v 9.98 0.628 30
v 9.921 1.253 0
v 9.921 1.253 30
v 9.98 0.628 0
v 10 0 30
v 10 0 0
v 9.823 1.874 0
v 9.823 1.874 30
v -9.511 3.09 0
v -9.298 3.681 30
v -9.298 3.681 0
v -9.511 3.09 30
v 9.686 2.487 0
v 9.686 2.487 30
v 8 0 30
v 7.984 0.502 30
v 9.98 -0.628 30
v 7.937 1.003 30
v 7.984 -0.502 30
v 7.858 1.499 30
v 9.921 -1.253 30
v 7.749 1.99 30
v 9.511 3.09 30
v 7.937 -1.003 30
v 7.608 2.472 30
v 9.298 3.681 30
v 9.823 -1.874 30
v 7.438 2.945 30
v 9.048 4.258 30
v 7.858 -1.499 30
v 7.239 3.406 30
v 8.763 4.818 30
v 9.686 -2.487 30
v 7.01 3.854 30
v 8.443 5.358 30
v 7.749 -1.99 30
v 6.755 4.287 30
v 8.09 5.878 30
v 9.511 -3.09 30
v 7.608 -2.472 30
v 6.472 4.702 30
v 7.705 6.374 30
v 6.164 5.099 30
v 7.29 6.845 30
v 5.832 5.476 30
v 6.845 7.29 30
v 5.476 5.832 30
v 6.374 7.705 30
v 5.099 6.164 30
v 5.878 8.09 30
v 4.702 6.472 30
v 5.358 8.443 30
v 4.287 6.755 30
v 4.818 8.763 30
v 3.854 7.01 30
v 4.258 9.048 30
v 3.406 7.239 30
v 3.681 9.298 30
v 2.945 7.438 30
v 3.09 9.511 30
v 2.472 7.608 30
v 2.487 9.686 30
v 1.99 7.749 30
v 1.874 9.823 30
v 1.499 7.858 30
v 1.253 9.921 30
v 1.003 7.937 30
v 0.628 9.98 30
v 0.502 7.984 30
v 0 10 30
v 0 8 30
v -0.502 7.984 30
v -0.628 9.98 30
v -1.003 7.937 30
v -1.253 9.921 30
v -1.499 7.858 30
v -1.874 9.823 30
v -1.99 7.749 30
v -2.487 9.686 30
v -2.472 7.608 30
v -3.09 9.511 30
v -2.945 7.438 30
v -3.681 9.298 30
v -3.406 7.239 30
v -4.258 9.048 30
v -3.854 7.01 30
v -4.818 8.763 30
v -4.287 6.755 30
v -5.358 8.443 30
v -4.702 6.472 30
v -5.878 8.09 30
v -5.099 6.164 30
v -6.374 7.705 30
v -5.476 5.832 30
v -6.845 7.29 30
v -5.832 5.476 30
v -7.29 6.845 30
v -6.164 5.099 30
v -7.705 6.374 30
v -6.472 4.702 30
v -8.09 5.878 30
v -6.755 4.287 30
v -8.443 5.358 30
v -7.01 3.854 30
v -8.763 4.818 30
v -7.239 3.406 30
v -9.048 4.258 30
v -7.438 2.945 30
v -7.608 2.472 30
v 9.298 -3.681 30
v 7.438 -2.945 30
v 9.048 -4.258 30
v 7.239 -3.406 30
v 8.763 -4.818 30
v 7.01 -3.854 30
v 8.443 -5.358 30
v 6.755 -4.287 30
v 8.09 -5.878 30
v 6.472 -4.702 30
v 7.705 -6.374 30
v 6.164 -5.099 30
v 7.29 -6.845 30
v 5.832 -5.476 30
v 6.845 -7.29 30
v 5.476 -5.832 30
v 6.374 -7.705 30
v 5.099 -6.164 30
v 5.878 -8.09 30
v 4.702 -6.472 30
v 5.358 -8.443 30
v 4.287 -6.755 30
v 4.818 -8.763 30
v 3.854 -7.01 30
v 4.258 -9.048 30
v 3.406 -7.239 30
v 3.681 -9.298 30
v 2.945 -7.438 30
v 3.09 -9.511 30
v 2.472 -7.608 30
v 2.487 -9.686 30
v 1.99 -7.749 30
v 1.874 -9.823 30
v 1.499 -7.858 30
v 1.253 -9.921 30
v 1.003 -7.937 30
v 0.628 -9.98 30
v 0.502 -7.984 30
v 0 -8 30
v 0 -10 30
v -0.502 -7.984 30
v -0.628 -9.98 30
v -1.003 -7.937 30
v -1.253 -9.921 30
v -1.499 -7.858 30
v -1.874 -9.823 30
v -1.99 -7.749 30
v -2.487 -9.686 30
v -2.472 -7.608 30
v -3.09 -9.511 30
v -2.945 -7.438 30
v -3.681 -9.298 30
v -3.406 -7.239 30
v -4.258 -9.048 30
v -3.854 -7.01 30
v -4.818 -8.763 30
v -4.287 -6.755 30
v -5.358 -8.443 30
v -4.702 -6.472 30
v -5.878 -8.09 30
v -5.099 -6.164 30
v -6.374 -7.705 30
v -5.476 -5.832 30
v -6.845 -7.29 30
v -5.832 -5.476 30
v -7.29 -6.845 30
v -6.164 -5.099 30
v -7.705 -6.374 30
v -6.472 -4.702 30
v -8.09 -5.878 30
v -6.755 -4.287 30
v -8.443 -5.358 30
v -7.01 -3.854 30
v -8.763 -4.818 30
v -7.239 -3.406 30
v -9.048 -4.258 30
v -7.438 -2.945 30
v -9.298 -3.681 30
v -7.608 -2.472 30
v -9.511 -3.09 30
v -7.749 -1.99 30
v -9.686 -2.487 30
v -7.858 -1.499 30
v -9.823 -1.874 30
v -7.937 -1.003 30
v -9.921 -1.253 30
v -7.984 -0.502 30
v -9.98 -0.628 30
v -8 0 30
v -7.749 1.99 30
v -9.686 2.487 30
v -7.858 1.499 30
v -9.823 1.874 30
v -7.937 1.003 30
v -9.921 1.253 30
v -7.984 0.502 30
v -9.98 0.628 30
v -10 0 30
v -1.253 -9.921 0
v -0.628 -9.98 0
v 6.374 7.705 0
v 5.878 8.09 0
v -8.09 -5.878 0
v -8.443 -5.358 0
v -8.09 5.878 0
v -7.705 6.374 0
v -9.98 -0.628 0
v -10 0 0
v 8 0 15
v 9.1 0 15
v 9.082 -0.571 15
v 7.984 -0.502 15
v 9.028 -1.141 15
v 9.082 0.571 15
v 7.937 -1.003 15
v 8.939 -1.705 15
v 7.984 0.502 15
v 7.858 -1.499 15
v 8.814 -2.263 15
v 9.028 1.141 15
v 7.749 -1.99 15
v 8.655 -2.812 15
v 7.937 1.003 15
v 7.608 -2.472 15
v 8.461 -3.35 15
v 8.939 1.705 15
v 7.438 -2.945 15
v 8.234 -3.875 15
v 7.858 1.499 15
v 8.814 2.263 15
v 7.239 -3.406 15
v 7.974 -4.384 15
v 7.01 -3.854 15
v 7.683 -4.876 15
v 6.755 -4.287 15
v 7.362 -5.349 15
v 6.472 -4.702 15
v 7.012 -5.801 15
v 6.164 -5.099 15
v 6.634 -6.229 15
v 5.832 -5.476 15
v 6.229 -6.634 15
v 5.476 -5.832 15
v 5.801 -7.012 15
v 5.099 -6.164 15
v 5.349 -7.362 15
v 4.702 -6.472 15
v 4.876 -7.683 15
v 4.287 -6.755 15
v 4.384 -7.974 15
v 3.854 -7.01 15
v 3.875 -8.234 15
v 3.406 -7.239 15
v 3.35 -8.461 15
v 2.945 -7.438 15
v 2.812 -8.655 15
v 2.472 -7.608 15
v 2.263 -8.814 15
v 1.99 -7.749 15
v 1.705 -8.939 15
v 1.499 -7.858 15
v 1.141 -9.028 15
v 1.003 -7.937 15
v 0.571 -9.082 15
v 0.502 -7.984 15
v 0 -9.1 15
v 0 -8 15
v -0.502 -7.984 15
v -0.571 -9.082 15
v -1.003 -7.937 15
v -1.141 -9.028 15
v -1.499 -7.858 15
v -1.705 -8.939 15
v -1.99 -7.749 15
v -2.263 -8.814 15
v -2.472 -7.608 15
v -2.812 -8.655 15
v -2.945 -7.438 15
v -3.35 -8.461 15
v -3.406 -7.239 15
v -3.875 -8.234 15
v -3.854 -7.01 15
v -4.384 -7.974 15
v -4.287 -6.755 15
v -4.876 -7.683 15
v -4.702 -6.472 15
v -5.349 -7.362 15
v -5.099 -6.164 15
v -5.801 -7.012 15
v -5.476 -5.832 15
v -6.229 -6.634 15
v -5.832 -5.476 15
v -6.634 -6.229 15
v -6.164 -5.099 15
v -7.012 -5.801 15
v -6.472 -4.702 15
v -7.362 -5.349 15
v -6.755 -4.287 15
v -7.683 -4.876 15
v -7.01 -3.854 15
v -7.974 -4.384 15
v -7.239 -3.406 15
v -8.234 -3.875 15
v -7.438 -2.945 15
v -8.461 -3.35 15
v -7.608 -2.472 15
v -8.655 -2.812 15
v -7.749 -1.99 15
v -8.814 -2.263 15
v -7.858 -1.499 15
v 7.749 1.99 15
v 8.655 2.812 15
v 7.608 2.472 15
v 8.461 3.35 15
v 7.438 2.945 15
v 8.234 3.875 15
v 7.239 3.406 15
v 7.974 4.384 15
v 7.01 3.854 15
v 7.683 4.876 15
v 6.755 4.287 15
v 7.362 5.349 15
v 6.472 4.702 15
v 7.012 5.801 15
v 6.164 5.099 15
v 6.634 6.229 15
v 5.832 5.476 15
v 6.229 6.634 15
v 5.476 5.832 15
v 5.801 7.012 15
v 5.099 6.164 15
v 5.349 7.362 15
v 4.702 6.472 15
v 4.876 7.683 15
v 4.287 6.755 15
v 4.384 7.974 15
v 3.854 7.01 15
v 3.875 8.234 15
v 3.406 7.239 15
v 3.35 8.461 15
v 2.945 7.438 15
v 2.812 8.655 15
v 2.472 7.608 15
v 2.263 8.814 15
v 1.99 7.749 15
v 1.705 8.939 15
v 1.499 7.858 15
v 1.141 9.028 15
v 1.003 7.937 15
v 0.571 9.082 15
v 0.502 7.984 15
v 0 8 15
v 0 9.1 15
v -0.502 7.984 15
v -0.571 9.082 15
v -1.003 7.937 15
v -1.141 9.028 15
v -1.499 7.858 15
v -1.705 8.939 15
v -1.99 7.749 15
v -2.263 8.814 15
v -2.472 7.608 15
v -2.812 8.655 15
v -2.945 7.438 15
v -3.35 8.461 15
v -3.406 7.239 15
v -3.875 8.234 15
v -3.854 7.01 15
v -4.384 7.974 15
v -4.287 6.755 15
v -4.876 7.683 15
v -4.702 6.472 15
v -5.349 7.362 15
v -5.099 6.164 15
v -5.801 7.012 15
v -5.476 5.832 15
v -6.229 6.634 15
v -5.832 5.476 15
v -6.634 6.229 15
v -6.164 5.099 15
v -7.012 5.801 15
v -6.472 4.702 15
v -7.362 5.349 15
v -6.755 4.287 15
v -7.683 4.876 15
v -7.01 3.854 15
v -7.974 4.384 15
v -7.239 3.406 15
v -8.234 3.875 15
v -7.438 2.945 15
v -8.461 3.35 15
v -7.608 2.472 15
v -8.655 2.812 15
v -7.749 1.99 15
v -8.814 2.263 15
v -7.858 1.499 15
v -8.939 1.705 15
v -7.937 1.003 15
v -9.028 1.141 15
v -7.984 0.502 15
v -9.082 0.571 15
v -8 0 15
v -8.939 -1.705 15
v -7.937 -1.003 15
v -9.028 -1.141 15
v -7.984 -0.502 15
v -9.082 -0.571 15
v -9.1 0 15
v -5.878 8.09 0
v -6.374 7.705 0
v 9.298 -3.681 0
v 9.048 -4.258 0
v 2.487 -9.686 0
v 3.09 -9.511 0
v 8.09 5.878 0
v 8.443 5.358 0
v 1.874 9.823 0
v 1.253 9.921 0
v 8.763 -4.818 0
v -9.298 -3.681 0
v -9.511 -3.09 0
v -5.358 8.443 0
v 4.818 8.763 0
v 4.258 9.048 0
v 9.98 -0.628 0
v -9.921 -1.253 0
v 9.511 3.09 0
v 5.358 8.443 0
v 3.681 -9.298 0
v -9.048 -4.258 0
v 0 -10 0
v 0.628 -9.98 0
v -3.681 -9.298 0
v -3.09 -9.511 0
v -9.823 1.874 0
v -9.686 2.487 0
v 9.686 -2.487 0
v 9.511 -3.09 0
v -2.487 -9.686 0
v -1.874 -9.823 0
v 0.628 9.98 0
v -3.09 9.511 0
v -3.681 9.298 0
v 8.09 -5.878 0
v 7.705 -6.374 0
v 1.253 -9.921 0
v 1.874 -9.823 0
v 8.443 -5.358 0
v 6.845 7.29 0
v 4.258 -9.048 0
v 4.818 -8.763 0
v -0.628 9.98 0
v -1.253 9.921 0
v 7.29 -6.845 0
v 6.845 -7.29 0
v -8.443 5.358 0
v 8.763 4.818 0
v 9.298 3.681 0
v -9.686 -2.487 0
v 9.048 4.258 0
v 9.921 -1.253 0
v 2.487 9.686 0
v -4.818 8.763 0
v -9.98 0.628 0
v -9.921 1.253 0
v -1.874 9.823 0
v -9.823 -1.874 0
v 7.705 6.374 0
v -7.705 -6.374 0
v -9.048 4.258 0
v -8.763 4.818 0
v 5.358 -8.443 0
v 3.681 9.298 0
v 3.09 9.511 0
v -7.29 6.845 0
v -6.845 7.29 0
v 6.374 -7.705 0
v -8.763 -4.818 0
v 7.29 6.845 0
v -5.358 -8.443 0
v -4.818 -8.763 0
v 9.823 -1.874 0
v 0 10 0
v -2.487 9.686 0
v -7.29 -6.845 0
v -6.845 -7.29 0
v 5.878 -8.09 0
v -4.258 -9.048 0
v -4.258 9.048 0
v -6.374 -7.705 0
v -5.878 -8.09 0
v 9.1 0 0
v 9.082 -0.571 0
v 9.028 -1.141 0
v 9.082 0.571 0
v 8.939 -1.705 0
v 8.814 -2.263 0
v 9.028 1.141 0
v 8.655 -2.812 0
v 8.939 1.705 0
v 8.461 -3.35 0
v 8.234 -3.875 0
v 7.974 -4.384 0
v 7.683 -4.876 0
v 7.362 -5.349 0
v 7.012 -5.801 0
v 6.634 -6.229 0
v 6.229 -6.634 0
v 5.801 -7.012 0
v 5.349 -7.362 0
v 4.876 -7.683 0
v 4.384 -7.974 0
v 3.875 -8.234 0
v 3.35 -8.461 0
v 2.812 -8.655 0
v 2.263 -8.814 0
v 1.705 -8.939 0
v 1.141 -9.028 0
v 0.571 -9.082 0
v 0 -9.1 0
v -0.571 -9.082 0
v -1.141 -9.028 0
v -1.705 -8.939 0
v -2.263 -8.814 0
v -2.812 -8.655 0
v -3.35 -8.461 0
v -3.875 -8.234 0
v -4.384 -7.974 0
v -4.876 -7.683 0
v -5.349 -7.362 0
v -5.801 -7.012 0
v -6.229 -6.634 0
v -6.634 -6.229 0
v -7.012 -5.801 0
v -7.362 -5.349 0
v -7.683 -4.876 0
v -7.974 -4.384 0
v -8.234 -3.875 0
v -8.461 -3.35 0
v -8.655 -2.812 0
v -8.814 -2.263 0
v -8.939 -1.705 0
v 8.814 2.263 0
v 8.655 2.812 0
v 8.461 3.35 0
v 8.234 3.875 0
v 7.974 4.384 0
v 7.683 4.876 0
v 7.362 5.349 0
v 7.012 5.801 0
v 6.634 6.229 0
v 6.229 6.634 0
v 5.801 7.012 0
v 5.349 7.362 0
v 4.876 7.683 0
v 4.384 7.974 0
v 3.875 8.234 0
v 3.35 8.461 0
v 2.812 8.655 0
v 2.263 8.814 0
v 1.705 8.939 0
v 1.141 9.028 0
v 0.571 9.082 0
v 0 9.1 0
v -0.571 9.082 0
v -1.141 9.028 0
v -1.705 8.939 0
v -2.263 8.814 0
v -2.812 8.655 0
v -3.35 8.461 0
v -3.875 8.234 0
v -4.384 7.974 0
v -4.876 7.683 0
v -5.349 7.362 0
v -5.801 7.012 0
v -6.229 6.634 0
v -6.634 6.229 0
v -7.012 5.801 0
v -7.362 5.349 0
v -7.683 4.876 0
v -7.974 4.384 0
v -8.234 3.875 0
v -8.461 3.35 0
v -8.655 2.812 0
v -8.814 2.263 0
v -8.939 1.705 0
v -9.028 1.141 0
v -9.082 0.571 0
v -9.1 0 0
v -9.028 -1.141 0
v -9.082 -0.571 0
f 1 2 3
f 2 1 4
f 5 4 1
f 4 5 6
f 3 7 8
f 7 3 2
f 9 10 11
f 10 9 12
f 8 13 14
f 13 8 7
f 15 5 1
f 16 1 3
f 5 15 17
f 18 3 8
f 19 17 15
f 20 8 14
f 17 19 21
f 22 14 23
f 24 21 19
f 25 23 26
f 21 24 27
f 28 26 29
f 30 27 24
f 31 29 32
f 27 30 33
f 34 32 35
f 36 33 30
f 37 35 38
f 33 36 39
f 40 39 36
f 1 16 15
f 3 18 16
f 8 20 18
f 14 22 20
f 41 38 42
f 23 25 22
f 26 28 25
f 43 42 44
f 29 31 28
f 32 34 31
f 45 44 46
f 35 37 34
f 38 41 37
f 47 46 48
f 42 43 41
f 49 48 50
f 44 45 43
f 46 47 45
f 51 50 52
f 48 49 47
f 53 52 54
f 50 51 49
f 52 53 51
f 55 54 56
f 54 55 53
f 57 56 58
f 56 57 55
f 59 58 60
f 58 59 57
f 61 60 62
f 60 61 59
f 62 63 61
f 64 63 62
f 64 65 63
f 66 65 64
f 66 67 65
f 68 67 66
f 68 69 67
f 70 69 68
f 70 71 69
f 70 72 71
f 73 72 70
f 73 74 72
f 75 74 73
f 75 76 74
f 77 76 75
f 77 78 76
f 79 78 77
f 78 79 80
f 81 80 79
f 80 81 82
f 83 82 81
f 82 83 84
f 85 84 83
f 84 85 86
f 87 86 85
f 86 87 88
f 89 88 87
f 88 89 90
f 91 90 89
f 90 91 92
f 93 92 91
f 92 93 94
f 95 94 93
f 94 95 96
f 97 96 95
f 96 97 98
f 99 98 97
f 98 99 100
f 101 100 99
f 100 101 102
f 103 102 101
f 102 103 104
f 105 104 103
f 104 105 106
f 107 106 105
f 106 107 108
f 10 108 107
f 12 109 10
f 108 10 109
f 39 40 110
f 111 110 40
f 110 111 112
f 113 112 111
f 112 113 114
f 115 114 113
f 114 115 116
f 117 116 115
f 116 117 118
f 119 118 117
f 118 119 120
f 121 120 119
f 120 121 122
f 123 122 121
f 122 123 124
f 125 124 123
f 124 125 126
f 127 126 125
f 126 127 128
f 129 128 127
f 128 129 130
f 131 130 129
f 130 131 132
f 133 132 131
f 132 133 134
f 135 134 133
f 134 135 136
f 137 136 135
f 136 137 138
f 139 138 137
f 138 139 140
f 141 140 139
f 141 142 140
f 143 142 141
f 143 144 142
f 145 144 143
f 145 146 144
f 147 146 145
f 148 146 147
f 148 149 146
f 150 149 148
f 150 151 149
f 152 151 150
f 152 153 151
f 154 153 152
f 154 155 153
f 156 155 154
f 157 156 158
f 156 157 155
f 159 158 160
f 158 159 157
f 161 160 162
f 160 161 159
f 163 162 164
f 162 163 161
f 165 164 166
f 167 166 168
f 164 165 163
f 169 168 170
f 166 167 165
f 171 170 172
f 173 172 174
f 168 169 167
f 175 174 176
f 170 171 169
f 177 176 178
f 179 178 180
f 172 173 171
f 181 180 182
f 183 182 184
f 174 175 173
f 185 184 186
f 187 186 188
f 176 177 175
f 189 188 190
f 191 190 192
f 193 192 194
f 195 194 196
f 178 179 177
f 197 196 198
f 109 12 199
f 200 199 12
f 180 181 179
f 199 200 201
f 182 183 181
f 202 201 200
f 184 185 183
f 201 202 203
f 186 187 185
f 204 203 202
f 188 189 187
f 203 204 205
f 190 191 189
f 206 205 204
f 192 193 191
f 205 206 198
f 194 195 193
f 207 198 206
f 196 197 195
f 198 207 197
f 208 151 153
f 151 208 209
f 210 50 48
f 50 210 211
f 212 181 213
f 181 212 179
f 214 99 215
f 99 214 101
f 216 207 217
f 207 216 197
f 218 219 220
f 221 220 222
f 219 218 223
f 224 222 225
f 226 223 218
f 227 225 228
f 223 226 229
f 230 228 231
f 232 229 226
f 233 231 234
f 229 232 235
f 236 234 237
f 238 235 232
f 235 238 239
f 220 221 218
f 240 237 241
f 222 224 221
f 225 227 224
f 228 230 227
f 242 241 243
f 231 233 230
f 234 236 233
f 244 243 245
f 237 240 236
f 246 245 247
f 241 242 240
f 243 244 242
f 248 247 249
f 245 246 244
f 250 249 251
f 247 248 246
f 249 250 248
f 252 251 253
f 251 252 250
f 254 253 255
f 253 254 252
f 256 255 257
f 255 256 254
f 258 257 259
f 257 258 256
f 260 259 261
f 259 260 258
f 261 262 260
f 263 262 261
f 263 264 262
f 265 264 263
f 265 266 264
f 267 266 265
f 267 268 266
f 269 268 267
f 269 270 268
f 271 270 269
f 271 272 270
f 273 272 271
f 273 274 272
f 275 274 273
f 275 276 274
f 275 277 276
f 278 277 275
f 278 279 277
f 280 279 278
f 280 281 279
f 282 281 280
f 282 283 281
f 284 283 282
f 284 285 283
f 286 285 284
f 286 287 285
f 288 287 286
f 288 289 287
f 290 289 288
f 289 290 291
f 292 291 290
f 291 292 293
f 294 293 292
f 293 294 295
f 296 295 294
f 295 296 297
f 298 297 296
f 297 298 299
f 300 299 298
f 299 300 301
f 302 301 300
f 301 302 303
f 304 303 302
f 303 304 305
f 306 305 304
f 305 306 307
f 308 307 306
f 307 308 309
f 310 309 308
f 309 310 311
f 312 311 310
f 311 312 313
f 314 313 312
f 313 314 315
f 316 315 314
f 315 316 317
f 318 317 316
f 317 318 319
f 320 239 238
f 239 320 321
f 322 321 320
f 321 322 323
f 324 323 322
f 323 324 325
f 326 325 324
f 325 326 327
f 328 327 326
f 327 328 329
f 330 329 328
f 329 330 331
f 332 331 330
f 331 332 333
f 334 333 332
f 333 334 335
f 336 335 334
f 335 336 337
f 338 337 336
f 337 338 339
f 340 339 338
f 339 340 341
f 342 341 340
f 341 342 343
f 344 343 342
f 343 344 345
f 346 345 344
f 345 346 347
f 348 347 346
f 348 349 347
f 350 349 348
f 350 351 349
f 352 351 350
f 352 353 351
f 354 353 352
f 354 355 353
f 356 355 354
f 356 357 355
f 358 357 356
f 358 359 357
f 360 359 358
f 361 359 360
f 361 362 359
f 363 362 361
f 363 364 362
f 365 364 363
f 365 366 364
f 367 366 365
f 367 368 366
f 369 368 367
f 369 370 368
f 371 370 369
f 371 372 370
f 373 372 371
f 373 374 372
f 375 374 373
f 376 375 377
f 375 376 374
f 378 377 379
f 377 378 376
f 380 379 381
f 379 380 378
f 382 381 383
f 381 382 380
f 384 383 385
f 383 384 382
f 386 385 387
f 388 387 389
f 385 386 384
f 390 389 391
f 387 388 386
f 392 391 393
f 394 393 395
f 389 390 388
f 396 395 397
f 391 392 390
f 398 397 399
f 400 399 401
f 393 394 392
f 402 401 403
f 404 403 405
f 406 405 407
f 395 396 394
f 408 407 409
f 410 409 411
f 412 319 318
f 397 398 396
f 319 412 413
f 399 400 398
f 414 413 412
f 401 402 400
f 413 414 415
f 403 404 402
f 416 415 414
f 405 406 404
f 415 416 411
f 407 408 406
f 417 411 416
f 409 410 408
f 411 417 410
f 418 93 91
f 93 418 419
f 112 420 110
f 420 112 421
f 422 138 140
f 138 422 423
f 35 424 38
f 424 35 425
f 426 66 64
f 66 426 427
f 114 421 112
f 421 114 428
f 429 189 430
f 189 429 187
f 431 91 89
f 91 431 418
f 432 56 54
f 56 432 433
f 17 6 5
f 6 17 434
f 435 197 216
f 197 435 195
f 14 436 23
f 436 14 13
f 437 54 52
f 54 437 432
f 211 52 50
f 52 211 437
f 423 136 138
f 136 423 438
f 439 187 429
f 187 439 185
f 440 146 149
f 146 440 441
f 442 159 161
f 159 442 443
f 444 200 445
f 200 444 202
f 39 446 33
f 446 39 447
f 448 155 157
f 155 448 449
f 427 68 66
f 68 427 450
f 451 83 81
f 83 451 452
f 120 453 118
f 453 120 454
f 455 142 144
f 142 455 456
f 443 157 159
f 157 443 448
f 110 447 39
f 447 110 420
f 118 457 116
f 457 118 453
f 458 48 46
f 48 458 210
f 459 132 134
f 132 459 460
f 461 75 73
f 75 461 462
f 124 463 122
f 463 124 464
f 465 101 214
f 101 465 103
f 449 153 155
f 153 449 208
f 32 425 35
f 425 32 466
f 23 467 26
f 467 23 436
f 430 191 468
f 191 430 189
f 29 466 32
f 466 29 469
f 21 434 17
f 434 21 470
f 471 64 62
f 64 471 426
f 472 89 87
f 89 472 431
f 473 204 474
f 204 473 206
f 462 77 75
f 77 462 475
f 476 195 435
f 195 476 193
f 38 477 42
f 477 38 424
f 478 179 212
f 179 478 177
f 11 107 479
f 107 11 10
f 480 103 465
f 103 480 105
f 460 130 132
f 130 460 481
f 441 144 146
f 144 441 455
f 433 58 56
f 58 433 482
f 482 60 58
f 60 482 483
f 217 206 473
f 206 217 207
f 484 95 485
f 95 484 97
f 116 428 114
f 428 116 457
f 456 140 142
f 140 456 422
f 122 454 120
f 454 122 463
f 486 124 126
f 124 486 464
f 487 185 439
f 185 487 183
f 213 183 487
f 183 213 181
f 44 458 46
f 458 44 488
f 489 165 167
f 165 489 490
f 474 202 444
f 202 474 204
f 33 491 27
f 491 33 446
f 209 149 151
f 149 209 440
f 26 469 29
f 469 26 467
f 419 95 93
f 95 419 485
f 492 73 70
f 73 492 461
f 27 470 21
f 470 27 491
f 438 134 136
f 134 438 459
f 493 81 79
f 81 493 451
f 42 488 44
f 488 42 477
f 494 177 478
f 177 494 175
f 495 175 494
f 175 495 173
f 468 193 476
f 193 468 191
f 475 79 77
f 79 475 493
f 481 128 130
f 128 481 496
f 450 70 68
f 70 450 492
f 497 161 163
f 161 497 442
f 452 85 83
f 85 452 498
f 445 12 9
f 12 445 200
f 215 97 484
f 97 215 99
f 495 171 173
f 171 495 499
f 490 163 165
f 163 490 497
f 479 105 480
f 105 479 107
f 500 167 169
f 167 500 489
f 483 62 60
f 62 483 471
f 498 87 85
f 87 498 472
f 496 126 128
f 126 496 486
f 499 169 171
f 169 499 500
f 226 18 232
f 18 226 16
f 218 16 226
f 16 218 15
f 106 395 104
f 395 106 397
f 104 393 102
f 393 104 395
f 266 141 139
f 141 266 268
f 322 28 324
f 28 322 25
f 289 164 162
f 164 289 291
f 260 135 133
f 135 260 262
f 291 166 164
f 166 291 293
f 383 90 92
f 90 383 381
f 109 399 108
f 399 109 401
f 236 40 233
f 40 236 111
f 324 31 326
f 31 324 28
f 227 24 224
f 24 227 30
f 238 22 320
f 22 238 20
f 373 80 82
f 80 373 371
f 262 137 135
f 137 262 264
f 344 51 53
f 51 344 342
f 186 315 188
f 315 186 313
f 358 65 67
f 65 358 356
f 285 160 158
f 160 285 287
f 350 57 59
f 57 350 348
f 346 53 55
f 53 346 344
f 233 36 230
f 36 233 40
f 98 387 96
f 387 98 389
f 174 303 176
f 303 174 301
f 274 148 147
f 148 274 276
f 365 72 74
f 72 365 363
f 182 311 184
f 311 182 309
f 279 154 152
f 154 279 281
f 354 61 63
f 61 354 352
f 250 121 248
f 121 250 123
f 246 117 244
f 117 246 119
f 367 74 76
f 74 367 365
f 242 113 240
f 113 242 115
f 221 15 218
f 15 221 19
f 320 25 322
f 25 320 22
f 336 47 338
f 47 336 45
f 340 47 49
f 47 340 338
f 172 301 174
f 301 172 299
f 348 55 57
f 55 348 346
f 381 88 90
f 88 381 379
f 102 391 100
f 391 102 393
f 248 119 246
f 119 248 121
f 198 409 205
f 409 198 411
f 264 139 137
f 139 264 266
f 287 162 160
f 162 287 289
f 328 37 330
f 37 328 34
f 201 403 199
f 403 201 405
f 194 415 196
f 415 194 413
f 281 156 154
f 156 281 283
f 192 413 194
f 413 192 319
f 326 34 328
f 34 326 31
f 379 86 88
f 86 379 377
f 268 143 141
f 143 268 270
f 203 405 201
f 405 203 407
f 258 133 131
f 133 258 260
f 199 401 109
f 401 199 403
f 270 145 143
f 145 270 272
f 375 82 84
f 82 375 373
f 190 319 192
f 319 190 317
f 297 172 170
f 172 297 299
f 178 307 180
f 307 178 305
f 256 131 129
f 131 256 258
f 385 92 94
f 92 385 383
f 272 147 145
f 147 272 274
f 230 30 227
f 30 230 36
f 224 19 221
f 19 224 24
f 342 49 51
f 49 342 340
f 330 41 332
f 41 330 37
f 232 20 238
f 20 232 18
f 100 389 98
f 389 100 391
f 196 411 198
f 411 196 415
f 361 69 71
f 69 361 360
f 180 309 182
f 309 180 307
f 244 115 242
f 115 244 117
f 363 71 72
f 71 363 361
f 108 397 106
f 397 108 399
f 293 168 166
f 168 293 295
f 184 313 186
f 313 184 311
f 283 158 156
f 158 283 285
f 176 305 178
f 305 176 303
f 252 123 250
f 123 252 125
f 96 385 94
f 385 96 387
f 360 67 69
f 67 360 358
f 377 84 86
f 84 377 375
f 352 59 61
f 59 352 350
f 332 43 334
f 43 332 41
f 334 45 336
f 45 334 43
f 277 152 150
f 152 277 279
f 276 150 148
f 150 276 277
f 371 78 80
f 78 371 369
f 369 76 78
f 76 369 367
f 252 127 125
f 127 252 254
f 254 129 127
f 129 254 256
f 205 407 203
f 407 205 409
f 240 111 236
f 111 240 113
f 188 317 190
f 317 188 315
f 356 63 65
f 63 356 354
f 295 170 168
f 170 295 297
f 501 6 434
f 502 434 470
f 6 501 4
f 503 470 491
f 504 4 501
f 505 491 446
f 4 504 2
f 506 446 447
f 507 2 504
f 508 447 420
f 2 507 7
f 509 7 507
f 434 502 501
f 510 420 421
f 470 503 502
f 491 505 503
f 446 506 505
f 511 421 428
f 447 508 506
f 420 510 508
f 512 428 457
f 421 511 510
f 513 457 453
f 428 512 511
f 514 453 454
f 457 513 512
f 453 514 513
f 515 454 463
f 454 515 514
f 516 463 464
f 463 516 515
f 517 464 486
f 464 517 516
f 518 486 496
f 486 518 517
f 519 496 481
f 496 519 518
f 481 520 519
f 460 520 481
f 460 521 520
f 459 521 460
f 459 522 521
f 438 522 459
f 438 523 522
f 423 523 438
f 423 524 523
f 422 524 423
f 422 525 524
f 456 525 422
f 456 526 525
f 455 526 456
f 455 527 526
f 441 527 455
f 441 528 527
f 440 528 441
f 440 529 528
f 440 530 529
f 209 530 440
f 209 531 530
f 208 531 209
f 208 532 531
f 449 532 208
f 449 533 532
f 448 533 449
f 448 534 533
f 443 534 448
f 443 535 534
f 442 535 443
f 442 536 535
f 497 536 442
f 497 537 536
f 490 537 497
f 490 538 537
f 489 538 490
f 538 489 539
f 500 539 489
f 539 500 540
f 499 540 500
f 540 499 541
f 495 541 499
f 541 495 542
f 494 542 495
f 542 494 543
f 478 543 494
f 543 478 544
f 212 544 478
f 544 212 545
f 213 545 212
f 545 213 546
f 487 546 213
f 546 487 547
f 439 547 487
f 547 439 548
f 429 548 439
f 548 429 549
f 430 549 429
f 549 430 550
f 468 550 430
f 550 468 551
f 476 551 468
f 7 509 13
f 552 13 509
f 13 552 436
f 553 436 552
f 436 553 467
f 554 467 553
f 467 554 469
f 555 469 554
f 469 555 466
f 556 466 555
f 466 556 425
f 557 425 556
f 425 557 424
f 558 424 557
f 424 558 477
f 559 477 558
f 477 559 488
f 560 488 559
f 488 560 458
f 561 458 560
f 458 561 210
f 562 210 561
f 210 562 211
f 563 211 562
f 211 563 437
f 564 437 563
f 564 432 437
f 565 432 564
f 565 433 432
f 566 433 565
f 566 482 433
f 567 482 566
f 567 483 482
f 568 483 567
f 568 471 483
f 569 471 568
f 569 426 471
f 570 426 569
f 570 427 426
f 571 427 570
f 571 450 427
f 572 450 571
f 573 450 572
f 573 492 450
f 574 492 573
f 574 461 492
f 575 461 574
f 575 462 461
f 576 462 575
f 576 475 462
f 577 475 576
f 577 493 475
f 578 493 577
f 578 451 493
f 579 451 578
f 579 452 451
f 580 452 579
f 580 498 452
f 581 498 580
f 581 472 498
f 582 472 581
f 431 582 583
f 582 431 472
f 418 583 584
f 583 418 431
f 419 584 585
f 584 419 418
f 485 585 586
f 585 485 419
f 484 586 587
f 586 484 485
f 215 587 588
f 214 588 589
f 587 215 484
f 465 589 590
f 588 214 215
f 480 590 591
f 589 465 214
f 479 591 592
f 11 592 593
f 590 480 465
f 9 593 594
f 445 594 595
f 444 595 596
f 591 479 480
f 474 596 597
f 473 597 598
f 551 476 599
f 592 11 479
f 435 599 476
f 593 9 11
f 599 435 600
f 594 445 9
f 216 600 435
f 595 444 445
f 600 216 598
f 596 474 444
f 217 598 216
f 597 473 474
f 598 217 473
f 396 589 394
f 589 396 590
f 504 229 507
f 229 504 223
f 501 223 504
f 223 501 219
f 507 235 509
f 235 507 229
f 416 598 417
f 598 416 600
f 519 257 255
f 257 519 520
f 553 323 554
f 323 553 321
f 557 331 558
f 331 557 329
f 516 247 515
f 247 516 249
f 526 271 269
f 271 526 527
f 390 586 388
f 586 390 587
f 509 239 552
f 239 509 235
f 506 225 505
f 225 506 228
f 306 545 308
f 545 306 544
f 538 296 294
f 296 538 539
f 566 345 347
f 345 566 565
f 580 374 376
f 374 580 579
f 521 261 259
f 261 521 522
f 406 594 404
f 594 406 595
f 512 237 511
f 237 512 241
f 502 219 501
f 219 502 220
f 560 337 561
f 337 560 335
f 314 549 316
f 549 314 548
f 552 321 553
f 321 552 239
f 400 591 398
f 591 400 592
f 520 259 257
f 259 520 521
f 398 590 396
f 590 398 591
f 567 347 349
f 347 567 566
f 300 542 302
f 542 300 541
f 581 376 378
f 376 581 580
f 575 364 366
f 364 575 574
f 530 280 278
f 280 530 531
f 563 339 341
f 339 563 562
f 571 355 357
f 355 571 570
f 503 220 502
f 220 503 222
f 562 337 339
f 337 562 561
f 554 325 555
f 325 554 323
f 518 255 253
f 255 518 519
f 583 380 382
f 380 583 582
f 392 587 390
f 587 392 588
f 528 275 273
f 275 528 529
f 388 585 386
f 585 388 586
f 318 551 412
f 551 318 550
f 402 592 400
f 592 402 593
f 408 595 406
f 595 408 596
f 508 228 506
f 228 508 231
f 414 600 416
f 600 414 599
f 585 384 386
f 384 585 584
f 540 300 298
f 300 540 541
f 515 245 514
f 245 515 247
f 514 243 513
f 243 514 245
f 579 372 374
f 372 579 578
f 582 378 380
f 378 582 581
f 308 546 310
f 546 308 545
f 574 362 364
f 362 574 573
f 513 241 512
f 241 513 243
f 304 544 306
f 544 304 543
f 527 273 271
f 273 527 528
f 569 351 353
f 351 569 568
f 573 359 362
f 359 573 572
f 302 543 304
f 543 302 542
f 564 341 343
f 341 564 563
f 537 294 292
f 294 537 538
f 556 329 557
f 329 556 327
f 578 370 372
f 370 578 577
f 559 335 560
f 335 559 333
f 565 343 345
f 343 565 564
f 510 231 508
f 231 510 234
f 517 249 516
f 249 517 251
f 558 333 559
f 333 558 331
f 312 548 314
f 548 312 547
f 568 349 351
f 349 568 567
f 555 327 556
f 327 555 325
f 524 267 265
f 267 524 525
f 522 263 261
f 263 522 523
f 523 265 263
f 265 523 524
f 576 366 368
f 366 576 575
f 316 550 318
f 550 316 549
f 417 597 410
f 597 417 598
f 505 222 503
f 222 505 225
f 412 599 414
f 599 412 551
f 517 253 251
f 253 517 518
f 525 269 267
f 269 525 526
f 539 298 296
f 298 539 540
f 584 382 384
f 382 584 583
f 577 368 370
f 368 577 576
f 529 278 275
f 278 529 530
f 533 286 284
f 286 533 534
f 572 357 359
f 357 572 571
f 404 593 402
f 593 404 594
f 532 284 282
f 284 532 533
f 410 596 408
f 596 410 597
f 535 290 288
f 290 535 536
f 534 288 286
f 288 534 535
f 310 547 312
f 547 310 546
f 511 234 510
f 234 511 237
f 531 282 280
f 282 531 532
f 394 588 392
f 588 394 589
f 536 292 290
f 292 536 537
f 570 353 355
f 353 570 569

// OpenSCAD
// file: ../../../../../../../shapes/open-cylinder/open-cylinder.scad
// TODO: Lower this to 50.
module openCylinder(height = 3,
                    outerRadius = 7,
                    innerRadius = 4.5,
                    fn = 100)
{
    $fn = fn;

    difference()
    {
        cylinder(r=outerRadius,
                 h=height);

        translate([0, 0, -1])
        cylinder(r=innerRadius,
                 h=height+1.01);
    }
}
// file: ../../../../variable-diameter-round-connector.scad
use <../../../shapes/open-cylinder/open-cylinder.scad>

module roundConnector(bottomHeight = 10,
					  bottomInnerRadius = 4.5,
					  bottomOuterRadius = 7,
					  middleHeight = 10,
					  middleInnerRadius = 4.5,
					  middleOuterRadius = 15,
					  topHeight = 10,
					  topInnerRadius = 4.5,
				  	  topOuterRadius = 7)
{
	union()
	{
		color("teal")
		translate([0, 0, bottomHeight + middleHeight])
		roundConnector_top(height = topHeight,
						   innerRadius = topInnerRadius,
						   outerRadius = topOuterRadius);

		color("magenta")
		translate([0, 0, bottomHeight])
		roundConnector_middle(height = middleHeight,
							  innerRadius = middleInnerRadius,
							  outerRadius = middleOuterRadius);

		color("blue")
		roundConnector_Bottom(height = bottomHeight,
							  innerRadius = bottomInnerRadius,
							  outerRadius = bottomOuterRadius);
	}
}

module roundConnector_top(height, innerRadius, outerRadius)
{
	openCylinder(height = height,
				 innerRadius = innerRadius,
				 outerRadius = outerRadius);
}

module roundConnector_middle(height, innerRadius, outerRadius)
{
	openCylinder(height = height,
				 innerRadius = innerRadius,
				 outerRadius = outerRadius);
}

module roundConnector_Bottom(height, innerRadius, outerRadius)
{
	openCylinder(height = height,
				 innerRadius = innerRadius,
				 outerRadius = outerRadius);
}
// main file
use <../../../../variable-diameter-round-connector.scad>

roundConnector(bottomHeight = 15,
			  bottomInnerRadius = 9.1,
			  bottomOuterRadius = 10,
			  middleHeight = 0,
			  topHeight = 15,
			  topInnerRadius = 8,
		  	  topOuterRadius = 10);
